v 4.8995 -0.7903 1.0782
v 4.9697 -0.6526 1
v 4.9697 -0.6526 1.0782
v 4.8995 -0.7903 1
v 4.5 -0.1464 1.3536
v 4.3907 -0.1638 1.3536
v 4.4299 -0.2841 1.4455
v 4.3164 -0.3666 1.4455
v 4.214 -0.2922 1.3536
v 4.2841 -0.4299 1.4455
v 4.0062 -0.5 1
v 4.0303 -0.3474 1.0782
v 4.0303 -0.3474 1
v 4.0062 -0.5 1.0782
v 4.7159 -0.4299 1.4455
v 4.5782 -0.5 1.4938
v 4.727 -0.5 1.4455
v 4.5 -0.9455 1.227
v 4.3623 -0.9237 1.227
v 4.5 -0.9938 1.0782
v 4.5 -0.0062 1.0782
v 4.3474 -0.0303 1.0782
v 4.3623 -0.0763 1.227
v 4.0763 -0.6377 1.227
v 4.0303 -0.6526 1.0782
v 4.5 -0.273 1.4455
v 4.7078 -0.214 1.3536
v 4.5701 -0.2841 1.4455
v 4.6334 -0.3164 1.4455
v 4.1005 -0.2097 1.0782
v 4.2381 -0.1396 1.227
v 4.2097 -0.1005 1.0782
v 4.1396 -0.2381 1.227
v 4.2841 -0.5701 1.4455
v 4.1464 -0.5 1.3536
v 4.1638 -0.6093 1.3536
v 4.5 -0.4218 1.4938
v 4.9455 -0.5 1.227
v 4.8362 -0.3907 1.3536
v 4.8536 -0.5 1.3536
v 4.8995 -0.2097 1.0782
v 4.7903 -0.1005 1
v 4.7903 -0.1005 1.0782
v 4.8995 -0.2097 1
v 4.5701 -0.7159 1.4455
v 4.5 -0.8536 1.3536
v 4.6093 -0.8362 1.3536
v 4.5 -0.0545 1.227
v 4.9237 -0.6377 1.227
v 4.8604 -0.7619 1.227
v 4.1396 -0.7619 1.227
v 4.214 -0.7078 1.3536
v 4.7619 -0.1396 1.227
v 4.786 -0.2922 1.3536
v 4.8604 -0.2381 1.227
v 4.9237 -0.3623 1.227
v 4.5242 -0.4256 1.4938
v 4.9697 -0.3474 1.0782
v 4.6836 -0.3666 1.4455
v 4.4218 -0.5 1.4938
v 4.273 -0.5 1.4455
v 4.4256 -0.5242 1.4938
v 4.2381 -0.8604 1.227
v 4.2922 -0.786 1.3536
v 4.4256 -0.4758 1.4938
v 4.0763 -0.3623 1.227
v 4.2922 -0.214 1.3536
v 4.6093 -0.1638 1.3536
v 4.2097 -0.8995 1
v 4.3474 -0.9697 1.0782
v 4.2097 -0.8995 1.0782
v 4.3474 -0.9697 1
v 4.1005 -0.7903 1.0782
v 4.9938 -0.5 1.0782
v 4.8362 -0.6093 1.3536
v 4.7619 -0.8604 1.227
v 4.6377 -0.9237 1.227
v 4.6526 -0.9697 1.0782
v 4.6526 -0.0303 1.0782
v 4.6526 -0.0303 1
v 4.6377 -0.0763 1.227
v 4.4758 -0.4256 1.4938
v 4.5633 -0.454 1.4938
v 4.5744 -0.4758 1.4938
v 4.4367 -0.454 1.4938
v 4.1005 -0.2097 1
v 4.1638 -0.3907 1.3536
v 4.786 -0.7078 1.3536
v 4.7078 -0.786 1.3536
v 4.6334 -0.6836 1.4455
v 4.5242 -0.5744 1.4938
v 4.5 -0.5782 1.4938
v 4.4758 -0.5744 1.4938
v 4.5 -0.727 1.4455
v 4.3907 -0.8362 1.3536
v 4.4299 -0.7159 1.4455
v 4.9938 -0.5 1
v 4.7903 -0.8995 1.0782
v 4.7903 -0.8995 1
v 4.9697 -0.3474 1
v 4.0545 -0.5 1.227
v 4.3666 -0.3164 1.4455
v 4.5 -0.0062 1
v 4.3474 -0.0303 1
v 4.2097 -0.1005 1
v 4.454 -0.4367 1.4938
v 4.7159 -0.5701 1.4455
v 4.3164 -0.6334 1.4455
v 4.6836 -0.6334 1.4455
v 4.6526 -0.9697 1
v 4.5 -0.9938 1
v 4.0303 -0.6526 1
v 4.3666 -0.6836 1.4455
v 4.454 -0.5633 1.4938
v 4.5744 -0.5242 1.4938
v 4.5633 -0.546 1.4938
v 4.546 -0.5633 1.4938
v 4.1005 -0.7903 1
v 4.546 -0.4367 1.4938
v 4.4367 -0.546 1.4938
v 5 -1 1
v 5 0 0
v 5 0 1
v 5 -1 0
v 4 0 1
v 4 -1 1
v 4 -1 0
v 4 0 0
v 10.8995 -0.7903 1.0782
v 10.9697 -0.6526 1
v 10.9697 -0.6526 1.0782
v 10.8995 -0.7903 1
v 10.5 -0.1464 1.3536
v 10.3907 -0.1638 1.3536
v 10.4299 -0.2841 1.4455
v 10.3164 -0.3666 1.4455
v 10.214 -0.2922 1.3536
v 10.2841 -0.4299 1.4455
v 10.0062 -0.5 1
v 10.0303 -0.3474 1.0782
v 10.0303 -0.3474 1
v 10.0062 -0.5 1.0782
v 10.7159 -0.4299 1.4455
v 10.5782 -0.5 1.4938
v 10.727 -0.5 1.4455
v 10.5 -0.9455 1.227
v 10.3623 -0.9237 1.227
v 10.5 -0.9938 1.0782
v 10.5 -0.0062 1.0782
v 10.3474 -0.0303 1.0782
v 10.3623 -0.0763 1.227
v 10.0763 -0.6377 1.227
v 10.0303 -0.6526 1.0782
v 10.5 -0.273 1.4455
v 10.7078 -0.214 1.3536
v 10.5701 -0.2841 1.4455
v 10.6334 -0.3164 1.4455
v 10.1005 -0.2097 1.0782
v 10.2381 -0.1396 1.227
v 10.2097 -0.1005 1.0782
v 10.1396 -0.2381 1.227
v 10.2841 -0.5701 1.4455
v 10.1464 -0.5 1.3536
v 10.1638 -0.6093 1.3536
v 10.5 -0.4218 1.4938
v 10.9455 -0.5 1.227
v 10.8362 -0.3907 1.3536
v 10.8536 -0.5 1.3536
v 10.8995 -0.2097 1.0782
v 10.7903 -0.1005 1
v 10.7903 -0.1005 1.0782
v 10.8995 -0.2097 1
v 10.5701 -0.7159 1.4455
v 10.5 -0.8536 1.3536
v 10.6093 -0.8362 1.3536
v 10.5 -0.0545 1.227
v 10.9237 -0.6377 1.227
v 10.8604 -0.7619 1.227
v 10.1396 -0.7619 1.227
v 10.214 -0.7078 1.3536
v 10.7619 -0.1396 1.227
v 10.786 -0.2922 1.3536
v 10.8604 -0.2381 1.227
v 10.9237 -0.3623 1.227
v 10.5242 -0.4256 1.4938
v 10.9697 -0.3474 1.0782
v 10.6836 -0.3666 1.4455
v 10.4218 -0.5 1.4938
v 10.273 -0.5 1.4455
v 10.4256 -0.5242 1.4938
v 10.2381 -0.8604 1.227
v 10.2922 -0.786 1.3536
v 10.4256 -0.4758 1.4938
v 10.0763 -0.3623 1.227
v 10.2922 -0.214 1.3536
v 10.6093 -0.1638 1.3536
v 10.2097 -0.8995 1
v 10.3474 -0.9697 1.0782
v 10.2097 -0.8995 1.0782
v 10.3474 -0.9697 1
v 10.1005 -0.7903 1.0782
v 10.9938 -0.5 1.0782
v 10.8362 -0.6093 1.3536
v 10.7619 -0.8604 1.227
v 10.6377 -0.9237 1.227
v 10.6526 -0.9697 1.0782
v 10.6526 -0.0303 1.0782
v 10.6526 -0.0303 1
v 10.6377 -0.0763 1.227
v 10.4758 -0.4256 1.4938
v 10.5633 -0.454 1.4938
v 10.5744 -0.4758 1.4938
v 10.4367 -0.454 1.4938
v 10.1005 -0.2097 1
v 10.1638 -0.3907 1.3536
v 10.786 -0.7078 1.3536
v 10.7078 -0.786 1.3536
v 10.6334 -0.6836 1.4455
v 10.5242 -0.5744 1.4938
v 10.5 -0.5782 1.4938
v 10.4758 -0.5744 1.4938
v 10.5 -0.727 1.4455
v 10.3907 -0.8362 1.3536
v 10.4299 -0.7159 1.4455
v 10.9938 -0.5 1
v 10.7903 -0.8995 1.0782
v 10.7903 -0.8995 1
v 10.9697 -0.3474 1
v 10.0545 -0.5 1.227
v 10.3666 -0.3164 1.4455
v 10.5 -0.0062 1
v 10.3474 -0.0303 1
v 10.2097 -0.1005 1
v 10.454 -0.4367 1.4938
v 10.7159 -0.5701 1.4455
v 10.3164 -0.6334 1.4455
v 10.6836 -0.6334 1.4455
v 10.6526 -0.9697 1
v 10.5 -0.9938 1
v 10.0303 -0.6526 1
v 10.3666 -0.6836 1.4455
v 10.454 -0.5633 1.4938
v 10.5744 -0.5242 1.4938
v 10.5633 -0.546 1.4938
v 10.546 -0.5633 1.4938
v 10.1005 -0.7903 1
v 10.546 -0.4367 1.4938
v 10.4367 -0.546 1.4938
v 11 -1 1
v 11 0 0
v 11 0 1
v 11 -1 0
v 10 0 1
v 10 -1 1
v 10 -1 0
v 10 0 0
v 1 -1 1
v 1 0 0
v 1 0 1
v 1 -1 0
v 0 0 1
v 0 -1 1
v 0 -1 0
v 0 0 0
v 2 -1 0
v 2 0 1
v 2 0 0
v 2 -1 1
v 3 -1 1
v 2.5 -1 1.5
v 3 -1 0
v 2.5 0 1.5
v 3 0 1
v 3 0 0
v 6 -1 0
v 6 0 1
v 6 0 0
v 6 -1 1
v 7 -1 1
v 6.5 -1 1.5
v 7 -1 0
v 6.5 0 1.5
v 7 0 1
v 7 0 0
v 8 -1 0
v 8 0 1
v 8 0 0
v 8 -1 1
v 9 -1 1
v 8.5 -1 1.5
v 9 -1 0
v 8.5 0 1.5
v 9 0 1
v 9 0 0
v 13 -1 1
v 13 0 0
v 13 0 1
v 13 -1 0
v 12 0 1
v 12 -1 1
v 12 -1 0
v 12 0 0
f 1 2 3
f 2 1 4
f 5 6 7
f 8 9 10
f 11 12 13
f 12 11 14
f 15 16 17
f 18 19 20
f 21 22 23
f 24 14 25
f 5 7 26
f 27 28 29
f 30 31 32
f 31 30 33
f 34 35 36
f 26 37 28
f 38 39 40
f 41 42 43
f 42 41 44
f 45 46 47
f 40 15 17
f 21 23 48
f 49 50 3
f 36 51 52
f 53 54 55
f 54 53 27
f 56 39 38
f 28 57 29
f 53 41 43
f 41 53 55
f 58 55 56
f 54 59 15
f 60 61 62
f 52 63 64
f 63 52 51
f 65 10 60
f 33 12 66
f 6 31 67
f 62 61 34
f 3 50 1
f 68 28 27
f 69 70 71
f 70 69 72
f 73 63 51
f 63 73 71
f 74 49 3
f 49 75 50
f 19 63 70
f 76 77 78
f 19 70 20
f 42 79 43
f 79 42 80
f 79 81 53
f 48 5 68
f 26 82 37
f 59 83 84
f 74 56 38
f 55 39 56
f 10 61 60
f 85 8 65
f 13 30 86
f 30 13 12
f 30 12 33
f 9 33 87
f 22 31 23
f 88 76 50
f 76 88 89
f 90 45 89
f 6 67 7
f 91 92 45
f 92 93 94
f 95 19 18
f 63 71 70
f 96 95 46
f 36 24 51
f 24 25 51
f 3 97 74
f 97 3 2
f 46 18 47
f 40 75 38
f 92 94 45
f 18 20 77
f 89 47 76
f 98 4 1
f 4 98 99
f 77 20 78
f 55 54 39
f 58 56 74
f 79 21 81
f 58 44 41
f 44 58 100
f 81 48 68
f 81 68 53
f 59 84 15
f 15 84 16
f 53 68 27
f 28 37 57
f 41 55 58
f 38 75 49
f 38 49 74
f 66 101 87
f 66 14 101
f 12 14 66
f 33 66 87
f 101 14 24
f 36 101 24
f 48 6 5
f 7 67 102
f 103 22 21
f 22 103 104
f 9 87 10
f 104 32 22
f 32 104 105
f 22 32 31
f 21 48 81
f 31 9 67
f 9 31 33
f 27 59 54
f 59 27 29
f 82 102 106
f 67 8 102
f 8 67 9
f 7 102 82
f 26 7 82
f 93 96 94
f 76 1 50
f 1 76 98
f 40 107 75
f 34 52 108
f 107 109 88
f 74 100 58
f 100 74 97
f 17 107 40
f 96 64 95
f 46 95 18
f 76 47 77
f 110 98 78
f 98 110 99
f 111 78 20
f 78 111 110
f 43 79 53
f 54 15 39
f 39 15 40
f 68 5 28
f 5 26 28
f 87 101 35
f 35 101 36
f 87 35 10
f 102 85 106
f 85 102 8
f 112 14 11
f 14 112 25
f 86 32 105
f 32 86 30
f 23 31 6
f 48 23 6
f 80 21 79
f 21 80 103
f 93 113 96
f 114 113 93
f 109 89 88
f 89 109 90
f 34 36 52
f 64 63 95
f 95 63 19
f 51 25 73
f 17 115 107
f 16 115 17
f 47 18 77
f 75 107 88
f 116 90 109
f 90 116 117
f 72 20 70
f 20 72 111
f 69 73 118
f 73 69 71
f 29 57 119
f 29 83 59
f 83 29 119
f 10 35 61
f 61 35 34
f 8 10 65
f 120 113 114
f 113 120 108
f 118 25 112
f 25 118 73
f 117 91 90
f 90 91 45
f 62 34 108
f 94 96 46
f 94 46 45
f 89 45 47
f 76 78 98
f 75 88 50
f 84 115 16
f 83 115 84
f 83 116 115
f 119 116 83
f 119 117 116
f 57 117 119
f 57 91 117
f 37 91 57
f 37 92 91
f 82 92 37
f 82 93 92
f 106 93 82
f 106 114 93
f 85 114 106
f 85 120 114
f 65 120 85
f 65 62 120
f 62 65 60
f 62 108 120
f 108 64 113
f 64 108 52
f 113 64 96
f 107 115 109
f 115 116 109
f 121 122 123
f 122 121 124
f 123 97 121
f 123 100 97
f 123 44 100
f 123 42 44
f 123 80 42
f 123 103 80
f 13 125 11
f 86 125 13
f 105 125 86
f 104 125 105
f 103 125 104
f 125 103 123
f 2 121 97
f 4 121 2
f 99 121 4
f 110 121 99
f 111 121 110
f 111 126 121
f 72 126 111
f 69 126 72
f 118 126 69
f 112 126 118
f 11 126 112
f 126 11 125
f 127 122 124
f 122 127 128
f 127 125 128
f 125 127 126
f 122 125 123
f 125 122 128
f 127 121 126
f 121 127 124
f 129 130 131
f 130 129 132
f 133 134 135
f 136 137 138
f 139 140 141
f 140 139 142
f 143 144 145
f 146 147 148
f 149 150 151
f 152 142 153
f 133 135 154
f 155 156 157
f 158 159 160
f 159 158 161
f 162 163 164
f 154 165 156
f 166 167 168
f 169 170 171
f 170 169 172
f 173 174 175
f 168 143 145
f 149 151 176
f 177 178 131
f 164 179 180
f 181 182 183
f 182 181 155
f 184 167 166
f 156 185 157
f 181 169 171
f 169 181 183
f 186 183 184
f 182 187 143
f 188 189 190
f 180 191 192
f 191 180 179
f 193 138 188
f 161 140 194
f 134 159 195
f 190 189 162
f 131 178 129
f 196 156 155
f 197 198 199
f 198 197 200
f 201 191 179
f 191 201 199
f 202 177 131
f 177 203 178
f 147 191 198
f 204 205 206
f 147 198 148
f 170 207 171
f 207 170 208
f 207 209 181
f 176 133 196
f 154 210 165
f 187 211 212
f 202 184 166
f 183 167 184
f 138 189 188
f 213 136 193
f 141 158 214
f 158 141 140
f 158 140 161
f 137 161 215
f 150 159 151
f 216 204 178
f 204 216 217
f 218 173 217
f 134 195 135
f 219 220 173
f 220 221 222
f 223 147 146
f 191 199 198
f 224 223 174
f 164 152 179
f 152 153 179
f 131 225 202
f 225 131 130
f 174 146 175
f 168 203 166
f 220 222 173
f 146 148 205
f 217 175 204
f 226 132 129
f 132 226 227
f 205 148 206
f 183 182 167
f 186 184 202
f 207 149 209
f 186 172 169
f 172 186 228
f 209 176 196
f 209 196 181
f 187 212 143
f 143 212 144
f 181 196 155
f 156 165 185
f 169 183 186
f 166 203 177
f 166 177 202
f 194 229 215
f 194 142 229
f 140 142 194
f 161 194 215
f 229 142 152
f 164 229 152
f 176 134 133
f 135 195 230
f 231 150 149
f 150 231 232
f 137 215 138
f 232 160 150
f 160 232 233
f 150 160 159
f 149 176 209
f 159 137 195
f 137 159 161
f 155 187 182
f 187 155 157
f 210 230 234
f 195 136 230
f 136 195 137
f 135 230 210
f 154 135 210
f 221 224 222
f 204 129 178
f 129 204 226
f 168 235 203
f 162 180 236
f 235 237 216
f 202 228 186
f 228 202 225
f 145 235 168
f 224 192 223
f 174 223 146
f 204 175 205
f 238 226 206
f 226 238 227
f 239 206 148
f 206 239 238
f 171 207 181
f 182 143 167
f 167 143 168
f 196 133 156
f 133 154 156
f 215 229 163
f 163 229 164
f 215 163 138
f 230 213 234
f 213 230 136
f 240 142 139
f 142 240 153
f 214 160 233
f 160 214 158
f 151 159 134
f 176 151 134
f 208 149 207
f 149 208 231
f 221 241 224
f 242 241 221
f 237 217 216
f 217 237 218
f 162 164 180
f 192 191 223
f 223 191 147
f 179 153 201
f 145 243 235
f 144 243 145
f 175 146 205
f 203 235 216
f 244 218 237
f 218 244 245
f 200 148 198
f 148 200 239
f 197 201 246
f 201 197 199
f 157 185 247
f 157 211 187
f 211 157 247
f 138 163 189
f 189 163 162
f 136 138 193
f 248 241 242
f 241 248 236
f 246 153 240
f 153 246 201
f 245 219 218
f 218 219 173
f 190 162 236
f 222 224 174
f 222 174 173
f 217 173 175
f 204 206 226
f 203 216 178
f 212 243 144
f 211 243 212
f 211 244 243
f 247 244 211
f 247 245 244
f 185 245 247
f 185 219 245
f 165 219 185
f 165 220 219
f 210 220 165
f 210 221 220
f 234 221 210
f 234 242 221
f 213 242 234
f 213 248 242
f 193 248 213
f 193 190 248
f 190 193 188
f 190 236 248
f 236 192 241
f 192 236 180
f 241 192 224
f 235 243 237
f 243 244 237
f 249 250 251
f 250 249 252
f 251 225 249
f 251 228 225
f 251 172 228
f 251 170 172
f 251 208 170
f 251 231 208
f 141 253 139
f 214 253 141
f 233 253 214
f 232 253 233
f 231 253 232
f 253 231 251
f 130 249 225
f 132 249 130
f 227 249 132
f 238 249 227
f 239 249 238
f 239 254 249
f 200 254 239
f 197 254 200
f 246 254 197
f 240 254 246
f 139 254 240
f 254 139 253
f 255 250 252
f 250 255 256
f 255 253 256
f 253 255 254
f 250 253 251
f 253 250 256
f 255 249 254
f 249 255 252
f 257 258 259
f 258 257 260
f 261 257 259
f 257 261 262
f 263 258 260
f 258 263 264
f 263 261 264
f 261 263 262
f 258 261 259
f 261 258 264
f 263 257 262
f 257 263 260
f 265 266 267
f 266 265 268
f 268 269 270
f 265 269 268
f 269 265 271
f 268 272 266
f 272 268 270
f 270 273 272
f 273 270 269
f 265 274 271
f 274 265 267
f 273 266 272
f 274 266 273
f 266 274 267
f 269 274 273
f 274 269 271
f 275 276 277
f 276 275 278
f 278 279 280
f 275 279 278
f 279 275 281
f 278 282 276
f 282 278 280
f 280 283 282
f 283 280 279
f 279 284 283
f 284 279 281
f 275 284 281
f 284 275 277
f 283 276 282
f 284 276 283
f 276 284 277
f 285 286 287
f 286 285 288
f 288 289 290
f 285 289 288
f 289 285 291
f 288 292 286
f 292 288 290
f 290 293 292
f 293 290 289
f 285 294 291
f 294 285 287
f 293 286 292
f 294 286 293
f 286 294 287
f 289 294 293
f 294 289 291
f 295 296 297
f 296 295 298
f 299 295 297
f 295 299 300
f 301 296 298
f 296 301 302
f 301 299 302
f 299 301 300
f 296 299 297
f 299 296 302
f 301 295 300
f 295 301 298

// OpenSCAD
module house(roof="flat",paint=[1,0,0]){
  color(paint)
  if(roof=="flat"){
    translate([0,-1,0])
    cube();
  } else if(roof=="pitched"){
    rotate([90,0,0])
    linear_extrude(height=1)
    polygon(points=[[0,0],[0,1],[0.5,1.5],[1,1],[1,0]],paths=[ [0,1,2,3,4] ]);
  } else if(roof=="domical"){
    translate([0,-1,0])
    union(){
      translate([0.5,0.5,1]) sphere(r=0.5,$fn=20);
      cube();   
    }
  }
}

union(){
  house();
  translate([2,0,0]) house("pitched");
  translate([4,0,0]) house("domical",[0,1,0]);
  translate([6,0,0]) house(roof="pitched",paint=[0,0,1]);
  translate([8,0,0]) house(paint=[0,0,0],roof="pitched");
  translate([10,0,0]) house(roof="domical");
  translate([12,0,0]) house(paint=[0,0.5,0.5]);
}
